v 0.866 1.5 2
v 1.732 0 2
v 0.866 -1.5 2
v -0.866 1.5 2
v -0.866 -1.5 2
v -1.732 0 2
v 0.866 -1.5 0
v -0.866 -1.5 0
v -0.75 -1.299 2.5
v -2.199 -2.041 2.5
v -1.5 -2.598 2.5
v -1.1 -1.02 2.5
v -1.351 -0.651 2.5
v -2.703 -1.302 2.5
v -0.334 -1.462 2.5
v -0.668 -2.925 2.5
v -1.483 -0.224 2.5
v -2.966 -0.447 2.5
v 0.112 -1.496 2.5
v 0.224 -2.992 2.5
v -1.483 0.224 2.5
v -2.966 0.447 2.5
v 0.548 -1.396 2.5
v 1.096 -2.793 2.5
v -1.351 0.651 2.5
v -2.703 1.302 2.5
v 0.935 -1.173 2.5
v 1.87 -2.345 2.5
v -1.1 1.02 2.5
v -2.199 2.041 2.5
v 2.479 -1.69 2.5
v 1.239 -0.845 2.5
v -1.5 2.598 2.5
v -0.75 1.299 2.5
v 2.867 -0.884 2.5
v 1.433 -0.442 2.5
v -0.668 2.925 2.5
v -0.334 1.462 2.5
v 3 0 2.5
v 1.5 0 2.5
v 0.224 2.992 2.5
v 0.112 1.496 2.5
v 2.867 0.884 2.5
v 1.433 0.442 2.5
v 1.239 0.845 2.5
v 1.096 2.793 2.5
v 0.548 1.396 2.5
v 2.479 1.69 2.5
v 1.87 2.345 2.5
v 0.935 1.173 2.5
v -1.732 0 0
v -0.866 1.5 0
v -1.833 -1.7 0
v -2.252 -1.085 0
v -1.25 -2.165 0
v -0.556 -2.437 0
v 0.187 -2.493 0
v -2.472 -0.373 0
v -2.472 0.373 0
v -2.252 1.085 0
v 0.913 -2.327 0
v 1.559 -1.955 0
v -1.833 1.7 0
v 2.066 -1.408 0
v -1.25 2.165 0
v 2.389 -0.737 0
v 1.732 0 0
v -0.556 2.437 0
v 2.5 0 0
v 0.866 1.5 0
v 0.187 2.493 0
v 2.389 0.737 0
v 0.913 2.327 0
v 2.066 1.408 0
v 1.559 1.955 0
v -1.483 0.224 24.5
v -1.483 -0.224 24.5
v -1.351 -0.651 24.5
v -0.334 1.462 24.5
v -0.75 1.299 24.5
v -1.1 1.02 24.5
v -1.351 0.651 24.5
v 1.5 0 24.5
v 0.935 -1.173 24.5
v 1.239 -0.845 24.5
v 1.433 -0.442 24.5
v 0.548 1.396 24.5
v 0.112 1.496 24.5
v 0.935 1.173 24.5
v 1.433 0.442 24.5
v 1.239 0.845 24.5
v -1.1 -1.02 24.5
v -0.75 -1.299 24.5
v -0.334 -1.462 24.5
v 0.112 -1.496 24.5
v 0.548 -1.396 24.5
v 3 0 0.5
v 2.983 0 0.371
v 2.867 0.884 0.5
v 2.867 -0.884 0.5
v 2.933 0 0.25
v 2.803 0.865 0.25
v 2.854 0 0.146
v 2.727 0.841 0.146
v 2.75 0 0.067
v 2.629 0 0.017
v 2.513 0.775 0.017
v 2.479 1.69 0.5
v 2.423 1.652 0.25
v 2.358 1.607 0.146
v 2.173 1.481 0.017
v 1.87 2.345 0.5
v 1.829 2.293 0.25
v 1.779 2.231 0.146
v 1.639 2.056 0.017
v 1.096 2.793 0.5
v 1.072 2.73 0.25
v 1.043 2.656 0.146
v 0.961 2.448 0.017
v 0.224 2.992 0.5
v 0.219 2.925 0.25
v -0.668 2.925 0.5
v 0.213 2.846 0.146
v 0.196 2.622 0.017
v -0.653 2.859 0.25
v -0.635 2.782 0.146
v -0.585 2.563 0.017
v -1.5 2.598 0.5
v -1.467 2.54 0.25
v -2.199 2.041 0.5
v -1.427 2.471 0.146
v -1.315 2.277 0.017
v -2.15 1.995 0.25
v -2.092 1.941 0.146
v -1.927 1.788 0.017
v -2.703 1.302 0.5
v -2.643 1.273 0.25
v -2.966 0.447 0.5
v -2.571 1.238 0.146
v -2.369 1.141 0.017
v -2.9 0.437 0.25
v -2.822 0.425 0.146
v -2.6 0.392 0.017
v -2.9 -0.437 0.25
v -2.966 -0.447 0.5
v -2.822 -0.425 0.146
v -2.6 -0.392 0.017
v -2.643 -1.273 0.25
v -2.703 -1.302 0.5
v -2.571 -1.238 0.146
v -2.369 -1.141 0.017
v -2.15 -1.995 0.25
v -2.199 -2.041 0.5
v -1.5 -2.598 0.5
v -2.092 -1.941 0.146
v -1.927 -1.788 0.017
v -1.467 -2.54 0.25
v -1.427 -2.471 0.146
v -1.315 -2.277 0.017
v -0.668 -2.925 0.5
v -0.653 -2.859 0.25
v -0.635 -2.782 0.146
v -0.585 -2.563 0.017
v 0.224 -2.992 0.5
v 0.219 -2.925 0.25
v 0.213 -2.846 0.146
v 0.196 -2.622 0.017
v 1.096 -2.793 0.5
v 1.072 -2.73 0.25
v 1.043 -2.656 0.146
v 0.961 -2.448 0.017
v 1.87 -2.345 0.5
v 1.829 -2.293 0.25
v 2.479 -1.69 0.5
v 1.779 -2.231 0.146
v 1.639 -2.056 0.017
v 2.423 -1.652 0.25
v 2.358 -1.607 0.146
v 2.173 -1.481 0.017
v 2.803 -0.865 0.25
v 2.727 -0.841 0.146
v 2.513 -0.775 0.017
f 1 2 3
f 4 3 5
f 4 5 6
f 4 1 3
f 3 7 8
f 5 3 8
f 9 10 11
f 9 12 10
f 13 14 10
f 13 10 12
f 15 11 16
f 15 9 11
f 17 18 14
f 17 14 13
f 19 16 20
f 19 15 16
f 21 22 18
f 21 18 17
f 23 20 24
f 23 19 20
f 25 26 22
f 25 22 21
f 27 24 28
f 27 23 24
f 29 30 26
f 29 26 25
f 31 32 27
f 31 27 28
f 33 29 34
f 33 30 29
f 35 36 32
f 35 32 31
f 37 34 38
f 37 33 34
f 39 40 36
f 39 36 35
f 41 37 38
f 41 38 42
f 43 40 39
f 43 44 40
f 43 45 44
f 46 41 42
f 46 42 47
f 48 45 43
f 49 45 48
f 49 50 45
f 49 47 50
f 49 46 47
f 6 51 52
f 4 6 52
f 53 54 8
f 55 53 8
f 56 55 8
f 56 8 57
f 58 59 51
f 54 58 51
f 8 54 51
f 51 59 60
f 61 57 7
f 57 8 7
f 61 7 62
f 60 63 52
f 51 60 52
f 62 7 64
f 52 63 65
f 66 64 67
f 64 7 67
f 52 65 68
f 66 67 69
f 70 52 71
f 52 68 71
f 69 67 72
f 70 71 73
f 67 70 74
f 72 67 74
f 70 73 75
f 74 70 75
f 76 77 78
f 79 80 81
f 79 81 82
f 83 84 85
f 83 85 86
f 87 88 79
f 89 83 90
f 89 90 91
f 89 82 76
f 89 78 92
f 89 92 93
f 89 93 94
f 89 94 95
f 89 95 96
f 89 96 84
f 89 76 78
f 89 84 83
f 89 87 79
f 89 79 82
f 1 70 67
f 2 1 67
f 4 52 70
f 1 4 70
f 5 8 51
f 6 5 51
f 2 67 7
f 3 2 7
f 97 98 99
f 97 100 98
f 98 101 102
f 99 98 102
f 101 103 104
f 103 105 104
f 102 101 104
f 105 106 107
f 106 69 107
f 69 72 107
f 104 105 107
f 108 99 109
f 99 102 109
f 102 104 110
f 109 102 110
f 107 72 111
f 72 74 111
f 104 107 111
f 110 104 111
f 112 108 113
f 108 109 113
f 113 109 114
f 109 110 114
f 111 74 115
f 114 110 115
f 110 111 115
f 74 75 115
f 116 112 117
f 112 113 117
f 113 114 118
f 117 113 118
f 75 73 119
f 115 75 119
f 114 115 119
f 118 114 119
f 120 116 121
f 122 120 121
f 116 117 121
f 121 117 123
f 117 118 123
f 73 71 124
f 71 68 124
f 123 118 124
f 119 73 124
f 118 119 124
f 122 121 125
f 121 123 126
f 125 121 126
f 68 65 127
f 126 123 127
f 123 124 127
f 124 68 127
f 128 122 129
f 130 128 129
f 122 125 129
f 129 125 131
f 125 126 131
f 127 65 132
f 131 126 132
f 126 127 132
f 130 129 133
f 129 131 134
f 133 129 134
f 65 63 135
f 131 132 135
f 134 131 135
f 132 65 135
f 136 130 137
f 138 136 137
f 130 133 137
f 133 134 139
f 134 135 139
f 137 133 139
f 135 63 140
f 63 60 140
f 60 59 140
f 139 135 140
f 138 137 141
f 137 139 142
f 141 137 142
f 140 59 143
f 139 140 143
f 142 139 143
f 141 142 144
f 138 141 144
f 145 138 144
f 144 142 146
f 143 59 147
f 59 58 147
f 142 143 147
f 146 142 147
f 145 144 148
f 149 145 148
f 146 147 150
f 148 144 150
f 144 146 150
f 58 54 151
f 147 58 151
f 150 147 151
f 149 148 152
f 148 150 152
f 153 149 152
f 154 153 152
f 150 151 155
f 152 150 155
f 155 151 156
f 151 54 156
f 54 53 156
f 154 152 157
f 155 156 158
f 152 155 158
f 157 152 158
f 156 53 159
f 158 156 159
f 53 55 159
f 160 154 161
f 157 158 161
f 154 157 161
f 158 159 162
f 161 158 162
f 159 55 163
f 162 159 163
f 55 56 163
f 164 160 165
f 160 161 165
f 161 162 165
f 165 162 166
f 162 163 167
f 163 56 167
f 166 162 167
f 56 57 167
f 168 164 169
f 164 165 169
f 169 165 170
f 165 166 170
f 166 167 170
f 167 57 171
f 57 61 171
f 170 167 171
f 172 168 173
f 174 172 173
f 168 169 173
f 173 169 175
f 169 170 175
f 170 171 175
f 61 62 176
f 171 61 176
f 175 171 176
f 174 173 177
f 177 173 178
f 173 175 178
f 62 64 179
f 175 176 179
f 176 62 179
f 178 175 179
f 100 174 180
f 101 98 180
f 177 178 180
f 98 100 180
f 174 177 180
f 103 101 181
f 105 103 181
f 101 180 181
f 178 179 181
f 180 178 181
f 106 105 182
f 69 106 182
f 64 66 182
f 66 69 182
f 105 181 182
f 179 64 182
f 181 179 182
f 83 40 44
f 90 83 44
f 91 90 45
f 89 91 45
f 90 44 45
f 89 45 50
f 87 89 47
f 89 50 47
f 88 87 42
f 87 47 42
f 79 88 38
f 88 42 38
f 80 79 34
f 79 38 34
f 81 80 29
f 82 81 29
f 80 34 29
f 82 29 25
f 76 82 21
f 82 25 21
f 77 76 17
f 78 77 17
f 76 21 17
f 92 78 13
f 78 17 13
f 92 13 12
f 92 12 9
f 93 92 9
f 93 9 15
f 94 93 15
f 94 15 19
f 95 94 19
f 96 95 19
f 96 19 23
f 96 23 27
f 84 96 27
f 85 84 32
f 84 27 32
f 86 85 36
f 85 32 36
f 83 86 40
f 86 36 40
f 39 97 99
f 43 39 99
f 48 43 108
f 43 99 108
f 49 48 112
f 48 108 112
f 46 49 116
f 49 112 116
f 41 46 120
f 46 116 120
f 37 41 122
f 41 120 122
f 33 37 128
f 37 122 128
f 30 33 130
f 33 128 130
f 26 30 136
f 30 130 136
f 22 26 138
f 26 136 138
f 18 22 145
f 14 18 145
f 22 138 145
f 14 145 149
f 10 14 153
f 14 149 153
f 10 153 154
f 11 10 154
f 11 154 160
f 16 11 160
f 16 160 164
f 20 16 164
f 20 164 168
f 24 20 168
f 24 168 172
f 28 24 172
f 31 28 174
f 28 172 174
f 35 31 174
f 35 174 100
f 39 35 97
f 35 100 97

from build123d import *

# Parameters (mm, degrees)
ESQUISSE1_R             = 3
BASE_EXTRUSION_DEPTH    = 2.5
ESQUISSE2_R             = 1.5
BOSS_EXTRU_1_DEPTH      = 22
CONG_1_R                = 0.5
ENL_V_MAT_EXTRU_1_DEPTH = 2


with BuildPart() as part:
    # Esquisse1 → Base-Extrusion (new body)
    with BuildSketch(Plane.XY):
        Circle(ESQUISSE1_R)
    extrude(amount=BASE_EXTRUSION_DEPTH)

    # Esquisse2 → Boss.-Extru.1 (add)
    with BuildSketch(Plane.XY.offset(2.5)):
        Circle(ESQUISSE2_R)
    extrude(amount=BOSS_EXTRU_1_DEPTH)

    # Congé1
    cong_1_edges = [part.edges().sort_by_distance(p)[0] for p in [
        (-3, 0, 0),
    ]]
    fillet(cong_1_edges, radius=CONG_1_R)

    # Esquisse3 → Enlèv. mat.-Extru.1 (cut)
    with BuildSketch(Plane(origin=(0, 0, 0), x_dir=(-1, 0, 0), z_dir=(0, 0, -1))):
        Polygon((1.732050808, 0), (0.866025404, 1.5), (-0.866025404, 1.5), (-1.732050808, 0), (-0.866025404, -1.5), (0.866025404, -1.5), align=None)
    extrude(amount=-ENL_V_MAT_EXTRU_1_DEPTH, mode=Mode.SUBTRACT)


solid = part.part
